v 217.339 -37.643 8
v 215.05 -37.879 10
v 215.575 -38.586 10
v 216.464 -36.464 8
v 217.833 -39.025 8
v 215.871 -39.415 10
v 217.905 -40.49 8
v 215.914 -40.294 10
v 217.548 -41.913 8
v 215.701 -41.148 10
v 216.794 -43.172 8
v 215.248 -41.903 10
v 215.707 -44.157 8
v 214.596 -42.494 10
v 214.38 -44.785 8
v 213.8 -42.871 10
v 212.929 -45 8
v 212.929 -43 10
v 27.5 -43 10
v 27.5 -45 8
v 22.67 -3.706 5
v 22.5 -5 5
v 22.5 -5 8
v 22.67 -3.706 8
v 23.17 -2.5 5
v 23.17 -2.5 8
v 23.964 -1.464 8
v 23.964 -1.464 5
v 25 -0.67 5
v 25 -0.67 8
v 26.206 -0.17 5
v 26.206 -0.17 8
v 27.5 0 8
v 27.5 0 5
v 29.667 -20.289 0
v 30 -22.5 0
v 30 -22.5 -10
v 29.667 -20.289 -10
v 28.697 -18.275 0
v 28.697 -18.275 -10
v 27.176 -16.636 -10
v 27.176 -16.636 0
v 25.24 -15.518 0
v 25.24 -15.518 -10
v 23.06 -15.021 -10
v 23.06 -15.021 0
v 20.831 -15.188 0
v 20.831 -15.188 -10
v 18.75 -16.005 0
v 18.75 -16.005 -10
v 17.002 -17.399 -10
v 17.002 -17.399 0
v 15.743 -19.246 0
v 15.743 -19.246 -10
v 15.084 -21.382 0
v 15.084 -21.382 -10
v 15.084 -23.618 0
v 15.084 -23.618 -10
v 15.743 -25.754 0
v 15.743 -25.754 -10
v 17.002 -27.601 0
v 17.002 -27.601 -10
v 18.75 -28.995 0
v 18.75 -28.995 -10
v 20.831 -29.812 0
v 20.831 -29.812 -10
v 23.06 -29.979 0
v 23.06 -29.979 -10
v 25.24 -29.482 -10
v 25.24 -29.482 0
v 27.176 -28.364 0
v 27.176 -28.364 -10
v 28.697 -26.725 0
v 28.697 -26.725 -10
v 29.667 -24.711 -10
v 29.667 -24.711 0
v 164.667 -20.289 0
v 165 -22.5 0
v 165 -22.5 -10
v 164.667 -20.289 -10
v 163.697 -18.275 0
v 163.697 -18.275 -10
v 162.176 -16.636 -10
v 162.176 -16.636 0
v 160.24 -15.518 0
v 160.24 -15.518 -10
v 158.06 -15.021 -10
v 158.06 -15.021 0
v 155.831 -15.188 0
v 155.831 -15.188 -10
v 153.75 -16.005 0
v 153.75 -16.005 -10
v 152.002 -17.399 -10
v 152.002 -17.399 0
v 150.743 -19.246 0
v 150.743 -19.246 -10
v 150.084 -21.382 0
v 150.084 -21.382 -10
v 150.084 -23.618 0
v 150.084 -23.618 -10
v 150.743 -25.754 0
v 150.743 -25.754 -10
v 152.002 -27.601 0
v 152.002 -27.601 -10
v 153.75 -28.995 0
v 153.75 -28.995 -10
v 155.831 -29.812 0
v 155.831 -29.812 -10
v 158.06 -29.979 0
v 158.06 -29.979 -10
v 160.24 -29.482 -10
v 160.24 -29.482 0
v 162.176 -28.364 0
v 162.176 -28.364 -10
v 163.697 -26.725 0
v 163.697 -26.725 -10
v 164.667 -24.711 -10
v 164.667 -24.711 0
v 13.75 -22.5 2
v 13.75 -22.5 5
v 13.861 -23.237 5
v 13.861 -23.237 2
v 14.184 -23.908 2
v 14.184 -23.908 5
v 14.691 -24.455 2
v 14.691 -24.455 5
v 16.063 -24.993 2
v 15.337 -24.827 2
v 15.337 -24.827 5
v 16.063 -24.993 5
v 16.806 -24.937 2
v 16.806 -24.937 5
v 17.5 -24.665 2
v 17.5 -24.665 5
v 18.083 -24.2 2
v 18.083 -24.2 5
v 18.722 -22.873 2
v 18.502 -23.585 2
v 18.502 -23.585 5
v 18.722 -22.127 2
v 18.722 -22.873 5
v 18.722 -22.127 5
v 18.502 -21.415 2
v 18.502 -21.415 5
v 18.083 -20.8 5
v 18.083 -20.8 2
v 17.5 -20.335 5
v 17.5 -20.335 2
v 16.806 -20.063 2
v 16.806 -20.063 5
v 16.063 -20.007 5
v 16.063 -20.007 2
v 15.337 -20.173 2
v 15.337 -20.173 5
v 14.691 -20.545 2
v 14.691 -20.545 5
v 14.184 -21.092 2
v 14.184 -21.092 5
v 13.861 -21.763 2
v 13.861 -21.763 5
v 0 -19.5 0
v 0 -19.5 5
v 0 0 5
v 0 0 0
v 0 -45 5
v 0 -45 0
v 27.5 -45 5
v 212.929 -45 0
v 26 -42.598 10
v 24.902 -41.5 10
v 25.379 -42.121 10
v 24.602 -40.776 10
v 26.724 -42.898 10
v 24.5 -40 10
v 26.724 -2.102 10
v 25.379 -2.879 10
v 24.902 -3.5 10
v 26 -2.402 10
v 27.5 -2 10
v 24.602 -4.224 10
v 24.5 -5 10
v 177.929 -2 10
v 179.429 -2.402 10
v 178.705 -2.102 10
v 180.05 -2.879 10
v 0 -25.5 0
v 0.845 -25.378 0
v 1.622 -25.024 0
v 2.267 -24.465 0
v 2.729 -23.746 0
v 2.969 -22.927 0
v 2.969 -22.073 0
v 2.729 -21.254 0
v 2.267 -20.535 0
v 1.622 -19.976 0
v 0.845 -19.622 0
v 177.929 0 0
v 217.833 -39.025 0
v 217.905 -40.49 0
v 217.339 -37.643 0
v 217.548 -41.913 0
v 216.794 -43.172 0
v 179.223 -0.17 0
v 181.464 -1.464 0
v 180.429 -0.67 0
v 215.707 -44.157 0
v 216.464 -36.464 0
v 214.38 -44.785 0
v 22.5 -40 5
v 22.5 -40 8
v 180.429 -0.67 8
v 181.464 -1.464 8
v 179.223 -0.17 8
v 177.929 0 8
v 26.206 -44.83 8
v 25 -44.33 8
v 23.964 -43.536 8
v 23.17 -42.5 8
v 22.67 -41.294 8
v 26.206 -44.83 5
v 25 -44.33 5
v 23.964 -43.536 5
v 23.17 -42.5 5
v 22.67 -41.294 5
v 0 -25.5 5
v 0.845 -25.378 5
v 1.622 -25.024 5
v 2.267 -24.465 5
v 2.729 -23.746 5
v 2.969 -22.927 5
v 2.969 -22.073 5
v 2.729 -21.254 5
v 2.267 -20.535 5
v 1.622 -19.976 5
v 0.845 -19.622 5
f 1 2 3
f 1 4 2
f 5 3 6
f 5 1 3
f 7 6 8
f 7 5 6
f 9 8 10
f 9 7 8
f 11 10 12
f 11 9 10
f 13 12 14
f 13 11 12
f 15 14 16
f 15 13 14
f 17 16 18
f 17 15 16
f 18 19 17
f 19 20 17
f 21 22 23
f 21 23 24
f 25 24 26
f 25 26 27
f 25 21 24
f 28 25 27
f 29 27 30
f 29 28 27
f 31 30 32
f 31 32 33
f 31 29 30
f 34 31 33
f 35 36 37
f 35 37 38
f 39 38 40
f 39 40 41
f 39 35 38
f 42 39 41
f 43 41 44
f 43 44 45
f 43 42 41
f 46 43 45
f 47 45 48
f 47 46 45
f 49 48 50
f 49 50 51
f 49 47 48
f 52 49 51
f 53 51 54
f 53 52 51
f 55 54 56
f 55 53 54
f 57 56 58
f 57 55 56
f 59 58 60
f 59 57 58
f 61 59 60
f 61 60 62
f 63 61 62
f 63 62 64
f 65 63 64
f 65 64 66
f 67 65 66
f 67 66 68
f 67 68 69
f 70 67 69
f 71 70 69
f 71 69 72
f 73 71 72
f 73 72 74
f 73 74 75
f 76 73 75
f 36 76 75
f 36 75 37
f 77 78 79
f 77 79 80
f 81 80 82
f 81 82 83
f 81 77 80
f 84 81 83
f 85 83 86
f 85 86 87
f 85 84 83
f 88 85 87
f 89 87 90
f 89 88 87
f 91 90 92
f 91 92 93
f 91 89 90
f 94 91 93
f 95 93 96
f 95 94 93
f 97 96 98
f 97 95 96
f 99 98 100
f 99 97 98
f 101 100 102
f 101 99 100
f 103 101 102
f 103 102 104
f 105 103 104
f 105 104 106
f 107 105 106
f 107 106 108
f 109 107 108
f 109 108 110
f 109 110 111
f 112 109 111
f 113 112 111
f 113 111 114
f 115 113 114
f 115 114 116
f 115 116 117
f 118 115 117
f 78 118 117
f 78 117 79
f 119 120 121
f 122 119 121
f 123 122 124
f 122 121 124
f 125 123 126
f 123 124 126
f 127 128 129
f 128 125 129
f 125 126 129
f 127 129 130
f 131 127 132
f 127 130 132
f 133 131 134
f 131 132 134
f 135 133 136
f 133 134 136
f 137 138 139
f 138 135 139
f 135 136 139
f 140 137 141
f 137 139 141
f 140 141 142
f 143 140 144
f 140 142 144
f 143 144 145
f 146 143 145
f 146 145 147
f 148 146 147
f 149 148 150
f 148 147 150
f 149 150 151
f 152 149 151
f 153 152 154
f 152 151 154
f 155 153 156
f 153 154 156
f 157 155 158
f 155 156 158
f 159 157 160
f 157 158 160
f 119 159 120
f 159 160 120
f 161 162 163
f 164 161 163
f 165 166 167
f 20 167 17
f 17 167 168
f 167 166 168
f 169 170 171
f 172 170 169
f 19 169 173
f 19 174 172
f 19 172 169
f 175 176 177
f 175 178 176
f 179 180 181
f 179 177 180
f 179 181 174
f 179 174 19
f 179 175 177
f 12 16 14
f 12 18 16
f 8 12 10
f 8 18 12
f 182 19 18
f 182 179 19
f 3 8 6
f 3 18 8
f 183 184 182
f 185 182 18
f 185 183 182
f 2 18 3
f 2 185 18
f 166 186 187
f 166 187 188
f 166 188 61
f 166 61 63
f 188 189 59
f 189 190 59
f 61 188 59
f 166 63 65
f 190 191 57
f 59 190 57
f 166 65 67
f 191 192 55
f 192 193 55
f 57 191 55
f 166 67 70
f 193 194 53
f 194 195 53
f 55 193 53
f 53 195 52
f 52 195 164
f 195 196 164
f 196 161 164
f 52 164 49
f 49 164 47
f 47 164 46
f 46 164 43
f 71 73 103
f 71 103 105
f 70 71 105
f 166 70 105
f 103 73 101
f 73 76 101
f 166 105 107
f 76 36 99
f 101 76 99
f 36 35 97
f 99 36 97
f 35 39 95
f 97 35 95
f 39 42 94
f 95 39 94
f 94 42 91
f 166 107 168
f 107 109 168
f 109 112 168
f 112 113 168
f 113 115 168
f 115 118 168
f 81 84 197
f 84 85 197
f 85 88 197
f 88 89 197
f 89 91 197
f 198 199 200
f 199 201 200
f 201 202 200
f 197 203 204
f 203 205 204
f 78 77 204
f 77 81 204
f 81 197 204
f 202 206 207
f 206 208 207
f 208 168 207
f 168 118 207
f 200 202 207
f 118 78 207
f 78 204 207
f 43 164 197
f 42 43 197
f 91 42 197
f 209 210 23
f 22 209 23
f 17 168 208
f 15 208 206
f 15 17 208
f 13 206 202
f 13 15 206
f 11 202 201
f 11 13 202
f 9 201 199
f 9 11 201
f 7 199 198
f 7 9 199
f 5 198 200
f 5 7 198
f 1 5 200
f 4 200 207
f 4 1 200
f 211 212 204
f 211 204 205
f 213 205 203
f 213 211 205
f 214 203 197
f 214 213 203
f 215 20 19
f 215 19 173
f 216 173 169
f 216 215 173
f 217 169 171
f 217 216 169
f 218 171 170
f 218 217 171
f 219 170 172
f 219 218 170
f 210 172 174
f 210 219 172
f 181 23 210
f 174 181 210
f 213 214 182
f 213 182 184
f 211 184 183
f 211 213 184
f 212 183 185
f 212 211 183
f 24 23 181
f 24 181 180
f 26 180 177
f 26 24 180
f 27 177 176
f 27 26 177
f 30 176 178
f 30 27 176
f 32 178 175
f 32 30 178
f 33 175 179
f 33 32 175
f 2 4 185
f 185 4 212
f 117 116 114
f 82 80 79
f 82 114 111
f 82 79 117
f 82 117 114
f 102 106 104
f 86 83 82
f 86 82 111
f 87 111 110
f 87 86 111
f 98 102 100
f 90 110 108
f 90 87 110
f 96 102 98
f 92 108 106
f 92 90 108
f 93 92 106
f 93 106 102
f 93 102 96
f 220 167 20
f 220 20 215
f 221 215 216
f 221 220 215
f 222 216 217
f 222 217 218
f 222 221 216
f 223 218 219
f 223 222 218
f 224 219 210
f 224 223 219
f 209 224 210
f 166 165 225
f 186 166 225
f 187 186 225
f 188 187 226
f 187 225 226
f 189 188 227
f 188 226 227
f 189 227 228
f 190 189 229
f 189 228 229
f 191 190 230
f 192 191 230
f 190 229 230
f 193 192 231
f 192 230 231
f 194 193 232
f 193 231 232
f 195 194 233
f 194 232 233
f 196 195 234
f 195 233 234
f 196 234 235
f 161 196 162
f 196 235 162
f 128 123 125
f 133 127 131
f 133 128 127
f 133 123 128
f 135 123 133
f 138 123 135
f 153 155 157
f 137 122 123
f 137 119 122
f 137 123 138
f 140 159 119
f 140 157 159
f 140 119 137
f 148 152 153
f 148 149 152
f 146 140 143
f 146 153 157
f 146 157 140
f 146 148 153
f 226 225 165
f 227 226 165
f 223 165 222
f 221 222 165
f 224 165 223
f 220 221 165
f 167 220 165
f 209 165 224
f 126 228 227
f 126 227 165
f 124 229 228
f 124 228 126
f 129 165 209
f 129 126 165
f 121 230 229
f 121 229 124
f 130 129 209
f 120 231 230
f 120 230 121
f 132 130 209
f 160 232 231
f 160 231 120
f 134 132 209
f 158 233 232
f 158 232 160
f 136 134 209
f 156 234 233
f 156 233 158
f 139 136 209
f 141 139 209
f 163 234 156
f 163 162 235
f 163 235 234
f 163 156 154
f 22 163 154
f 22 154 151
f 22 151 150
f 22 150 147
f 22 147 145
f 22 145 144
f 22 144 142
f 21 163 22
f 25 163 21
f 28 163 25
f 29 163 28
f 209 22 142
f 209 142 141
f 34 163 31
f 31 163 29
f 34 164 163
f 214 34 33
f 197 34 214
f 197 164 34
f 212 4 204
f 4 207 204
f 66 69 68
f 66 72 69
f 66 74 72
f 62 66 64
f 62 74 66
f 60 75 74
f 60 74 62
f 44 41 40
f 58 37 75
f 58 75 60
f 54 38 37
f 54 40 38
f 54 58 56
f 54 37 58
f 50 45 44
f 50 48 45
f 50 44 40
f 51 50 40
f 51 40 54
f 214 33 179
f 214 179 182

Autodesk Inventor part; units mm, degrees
ref_plane "YZ Plane" through (0, 0, 0) normal (1, 0, 0) x (0, 1, 0)
ref_plane "XZ Plane" through (0, 0, 0) normal (0, 1, 0) x (-1, 0, 0)
ref_plane "XY Plane" through (0, 0, 0) normal (0, 0, 1) x (1, 0, 0)
sketch "Sketch1" plane through (0, 0, 0) normal (0, 0, 1) x (1, 0, 0)
  line L0 (-180, 0) -> (0, 0)
  line L1 (-225, -45) -> (0, -45)
  line L2 (-180, 0) -> (-225, -45)
  line L3 (0, 0) -> (0, -45)
  dimension "d2" = 45
  dimension "d9" = 225
  dimension "d10" = 180
extrude "Extrusion1" add sketch "Sketch1" along normal blind 10
sketch "Sketch2" plane through (0, 0, 10) normal (0, 0, 1) x (1, 0, 0)
  line L0 (0, 0) -> (-180, 0) projected
  line L1 (-225, -45) -> (0, -45) projected
  line L2 (0, 0) -> (-22.5, 0)
  line L3 (-22.5, 0) -> (-22.5, -45)
  line L4 (-22.5, -45) -> (0, -45)
  line L5 (0, -45) -> (0, 0)
  dimension "d11" = 22.5
extrude "Extrusion2" cut sketch "Sketch2" against normal blind 5
sketch "Sketch3" plane through (0, 0, 5) normal (0, 0, 1) x (1, 0, 0)
  line L0 (0, -19.5) -> (0, -19.5)
  line L1 (0, -25.5) -> (0, -25.5)
  line L2 (-3, -22.5) -> (-3, -22.5)
  line L3 (0, -19.5) -> (0, -25.5)
  line L4 (0, -45) -> (-22.5, -45) projected
  arc A0 (0, -19.5) -> (-3, -22.5) centre (0, -22.5) ccw
  arc A1 (-3, -22.5) -> (0, -25.5) centre (0, -22.5) ccw
  point P0 (0, -22.5)
  dimension "d18" = 22.5
  dimension "d47" = 3
  dimension "d48" = 6
  dimension "d49" = 3
extrude "Extrusion3" cut sketch "Sketch3" against normal blind 5
sketch "Sketch4" plane through (0, 0, 0) normal (0, 0, -1) x (-1, 0, 0)
  circle A0 centre (22.5, -22.5) radius 7.5
  circle A1 centre (157.5, -22.5) radius 7.5
  point P0 (0, -45)
  point P1 (180, 0)
  dimension "d26" = 15
  dimension "d30" = 15
extrude "Extrusion4" add sketch "Sketch4" along normal blind 10
fillet "Fillet4" radius 5 4 edges at (-225, -45, 5) (-180, 0, 5) (-22.5, 0, 7.5) (-22.5, -45, 7.5)
chamfer "Chamfer2" distance 2 angle 45 8 edges at (-120.2145, -45, 10) (-23.9645, -43.5355, 10) (-22.5, -22.5, 10) (-23.9645, -1.4645, 10) (-102.7145, 0, 10) (-179.8423, -0.3806, 10) (-198.9645, -18.9645, 10) (-217.5483, -41.9134, 10)
sketch "Sketch5" plane through (0, 0, 5) normal (0, 0, 1) x (1, 0, 0)
  line L0 (-22.5, -40) -> (-22.5, -5) projected
  circle A0 centre (-16.25, -22.5) radius 2.5
  line L1 (0, -45) -> (-27.5, -45) projected
  point P0 (0, 0)
  dimension "d38" = 5
  dimension "d39" = 6.25
  dimension "d40" = 22.5
extrude "Extrusion5" cut sketch "Sketch5" against normal blind 3
mirror "Mirror1" about plane through (0, 0, 0) normal (1, 0, 0)
sketch "Sketch6" plane through (0, 0, 10) normal (0, 0, 1) x (1, 0, 0)
  line L0 (0, 20) -> (-240, 20)
  line L1 (-240, 20) -> (-240, -80)
  line L2 (-240, -80) -> (0, -80)
  line L3 (0, -80) -> (0, 20)
  point P0 (0, 0)
  dimension "d43" = 240
  dimension "d44" = 100
extrude "Extrusion6" cut sketch "Sketch6" against normal blind 20
properties part number "Border"
